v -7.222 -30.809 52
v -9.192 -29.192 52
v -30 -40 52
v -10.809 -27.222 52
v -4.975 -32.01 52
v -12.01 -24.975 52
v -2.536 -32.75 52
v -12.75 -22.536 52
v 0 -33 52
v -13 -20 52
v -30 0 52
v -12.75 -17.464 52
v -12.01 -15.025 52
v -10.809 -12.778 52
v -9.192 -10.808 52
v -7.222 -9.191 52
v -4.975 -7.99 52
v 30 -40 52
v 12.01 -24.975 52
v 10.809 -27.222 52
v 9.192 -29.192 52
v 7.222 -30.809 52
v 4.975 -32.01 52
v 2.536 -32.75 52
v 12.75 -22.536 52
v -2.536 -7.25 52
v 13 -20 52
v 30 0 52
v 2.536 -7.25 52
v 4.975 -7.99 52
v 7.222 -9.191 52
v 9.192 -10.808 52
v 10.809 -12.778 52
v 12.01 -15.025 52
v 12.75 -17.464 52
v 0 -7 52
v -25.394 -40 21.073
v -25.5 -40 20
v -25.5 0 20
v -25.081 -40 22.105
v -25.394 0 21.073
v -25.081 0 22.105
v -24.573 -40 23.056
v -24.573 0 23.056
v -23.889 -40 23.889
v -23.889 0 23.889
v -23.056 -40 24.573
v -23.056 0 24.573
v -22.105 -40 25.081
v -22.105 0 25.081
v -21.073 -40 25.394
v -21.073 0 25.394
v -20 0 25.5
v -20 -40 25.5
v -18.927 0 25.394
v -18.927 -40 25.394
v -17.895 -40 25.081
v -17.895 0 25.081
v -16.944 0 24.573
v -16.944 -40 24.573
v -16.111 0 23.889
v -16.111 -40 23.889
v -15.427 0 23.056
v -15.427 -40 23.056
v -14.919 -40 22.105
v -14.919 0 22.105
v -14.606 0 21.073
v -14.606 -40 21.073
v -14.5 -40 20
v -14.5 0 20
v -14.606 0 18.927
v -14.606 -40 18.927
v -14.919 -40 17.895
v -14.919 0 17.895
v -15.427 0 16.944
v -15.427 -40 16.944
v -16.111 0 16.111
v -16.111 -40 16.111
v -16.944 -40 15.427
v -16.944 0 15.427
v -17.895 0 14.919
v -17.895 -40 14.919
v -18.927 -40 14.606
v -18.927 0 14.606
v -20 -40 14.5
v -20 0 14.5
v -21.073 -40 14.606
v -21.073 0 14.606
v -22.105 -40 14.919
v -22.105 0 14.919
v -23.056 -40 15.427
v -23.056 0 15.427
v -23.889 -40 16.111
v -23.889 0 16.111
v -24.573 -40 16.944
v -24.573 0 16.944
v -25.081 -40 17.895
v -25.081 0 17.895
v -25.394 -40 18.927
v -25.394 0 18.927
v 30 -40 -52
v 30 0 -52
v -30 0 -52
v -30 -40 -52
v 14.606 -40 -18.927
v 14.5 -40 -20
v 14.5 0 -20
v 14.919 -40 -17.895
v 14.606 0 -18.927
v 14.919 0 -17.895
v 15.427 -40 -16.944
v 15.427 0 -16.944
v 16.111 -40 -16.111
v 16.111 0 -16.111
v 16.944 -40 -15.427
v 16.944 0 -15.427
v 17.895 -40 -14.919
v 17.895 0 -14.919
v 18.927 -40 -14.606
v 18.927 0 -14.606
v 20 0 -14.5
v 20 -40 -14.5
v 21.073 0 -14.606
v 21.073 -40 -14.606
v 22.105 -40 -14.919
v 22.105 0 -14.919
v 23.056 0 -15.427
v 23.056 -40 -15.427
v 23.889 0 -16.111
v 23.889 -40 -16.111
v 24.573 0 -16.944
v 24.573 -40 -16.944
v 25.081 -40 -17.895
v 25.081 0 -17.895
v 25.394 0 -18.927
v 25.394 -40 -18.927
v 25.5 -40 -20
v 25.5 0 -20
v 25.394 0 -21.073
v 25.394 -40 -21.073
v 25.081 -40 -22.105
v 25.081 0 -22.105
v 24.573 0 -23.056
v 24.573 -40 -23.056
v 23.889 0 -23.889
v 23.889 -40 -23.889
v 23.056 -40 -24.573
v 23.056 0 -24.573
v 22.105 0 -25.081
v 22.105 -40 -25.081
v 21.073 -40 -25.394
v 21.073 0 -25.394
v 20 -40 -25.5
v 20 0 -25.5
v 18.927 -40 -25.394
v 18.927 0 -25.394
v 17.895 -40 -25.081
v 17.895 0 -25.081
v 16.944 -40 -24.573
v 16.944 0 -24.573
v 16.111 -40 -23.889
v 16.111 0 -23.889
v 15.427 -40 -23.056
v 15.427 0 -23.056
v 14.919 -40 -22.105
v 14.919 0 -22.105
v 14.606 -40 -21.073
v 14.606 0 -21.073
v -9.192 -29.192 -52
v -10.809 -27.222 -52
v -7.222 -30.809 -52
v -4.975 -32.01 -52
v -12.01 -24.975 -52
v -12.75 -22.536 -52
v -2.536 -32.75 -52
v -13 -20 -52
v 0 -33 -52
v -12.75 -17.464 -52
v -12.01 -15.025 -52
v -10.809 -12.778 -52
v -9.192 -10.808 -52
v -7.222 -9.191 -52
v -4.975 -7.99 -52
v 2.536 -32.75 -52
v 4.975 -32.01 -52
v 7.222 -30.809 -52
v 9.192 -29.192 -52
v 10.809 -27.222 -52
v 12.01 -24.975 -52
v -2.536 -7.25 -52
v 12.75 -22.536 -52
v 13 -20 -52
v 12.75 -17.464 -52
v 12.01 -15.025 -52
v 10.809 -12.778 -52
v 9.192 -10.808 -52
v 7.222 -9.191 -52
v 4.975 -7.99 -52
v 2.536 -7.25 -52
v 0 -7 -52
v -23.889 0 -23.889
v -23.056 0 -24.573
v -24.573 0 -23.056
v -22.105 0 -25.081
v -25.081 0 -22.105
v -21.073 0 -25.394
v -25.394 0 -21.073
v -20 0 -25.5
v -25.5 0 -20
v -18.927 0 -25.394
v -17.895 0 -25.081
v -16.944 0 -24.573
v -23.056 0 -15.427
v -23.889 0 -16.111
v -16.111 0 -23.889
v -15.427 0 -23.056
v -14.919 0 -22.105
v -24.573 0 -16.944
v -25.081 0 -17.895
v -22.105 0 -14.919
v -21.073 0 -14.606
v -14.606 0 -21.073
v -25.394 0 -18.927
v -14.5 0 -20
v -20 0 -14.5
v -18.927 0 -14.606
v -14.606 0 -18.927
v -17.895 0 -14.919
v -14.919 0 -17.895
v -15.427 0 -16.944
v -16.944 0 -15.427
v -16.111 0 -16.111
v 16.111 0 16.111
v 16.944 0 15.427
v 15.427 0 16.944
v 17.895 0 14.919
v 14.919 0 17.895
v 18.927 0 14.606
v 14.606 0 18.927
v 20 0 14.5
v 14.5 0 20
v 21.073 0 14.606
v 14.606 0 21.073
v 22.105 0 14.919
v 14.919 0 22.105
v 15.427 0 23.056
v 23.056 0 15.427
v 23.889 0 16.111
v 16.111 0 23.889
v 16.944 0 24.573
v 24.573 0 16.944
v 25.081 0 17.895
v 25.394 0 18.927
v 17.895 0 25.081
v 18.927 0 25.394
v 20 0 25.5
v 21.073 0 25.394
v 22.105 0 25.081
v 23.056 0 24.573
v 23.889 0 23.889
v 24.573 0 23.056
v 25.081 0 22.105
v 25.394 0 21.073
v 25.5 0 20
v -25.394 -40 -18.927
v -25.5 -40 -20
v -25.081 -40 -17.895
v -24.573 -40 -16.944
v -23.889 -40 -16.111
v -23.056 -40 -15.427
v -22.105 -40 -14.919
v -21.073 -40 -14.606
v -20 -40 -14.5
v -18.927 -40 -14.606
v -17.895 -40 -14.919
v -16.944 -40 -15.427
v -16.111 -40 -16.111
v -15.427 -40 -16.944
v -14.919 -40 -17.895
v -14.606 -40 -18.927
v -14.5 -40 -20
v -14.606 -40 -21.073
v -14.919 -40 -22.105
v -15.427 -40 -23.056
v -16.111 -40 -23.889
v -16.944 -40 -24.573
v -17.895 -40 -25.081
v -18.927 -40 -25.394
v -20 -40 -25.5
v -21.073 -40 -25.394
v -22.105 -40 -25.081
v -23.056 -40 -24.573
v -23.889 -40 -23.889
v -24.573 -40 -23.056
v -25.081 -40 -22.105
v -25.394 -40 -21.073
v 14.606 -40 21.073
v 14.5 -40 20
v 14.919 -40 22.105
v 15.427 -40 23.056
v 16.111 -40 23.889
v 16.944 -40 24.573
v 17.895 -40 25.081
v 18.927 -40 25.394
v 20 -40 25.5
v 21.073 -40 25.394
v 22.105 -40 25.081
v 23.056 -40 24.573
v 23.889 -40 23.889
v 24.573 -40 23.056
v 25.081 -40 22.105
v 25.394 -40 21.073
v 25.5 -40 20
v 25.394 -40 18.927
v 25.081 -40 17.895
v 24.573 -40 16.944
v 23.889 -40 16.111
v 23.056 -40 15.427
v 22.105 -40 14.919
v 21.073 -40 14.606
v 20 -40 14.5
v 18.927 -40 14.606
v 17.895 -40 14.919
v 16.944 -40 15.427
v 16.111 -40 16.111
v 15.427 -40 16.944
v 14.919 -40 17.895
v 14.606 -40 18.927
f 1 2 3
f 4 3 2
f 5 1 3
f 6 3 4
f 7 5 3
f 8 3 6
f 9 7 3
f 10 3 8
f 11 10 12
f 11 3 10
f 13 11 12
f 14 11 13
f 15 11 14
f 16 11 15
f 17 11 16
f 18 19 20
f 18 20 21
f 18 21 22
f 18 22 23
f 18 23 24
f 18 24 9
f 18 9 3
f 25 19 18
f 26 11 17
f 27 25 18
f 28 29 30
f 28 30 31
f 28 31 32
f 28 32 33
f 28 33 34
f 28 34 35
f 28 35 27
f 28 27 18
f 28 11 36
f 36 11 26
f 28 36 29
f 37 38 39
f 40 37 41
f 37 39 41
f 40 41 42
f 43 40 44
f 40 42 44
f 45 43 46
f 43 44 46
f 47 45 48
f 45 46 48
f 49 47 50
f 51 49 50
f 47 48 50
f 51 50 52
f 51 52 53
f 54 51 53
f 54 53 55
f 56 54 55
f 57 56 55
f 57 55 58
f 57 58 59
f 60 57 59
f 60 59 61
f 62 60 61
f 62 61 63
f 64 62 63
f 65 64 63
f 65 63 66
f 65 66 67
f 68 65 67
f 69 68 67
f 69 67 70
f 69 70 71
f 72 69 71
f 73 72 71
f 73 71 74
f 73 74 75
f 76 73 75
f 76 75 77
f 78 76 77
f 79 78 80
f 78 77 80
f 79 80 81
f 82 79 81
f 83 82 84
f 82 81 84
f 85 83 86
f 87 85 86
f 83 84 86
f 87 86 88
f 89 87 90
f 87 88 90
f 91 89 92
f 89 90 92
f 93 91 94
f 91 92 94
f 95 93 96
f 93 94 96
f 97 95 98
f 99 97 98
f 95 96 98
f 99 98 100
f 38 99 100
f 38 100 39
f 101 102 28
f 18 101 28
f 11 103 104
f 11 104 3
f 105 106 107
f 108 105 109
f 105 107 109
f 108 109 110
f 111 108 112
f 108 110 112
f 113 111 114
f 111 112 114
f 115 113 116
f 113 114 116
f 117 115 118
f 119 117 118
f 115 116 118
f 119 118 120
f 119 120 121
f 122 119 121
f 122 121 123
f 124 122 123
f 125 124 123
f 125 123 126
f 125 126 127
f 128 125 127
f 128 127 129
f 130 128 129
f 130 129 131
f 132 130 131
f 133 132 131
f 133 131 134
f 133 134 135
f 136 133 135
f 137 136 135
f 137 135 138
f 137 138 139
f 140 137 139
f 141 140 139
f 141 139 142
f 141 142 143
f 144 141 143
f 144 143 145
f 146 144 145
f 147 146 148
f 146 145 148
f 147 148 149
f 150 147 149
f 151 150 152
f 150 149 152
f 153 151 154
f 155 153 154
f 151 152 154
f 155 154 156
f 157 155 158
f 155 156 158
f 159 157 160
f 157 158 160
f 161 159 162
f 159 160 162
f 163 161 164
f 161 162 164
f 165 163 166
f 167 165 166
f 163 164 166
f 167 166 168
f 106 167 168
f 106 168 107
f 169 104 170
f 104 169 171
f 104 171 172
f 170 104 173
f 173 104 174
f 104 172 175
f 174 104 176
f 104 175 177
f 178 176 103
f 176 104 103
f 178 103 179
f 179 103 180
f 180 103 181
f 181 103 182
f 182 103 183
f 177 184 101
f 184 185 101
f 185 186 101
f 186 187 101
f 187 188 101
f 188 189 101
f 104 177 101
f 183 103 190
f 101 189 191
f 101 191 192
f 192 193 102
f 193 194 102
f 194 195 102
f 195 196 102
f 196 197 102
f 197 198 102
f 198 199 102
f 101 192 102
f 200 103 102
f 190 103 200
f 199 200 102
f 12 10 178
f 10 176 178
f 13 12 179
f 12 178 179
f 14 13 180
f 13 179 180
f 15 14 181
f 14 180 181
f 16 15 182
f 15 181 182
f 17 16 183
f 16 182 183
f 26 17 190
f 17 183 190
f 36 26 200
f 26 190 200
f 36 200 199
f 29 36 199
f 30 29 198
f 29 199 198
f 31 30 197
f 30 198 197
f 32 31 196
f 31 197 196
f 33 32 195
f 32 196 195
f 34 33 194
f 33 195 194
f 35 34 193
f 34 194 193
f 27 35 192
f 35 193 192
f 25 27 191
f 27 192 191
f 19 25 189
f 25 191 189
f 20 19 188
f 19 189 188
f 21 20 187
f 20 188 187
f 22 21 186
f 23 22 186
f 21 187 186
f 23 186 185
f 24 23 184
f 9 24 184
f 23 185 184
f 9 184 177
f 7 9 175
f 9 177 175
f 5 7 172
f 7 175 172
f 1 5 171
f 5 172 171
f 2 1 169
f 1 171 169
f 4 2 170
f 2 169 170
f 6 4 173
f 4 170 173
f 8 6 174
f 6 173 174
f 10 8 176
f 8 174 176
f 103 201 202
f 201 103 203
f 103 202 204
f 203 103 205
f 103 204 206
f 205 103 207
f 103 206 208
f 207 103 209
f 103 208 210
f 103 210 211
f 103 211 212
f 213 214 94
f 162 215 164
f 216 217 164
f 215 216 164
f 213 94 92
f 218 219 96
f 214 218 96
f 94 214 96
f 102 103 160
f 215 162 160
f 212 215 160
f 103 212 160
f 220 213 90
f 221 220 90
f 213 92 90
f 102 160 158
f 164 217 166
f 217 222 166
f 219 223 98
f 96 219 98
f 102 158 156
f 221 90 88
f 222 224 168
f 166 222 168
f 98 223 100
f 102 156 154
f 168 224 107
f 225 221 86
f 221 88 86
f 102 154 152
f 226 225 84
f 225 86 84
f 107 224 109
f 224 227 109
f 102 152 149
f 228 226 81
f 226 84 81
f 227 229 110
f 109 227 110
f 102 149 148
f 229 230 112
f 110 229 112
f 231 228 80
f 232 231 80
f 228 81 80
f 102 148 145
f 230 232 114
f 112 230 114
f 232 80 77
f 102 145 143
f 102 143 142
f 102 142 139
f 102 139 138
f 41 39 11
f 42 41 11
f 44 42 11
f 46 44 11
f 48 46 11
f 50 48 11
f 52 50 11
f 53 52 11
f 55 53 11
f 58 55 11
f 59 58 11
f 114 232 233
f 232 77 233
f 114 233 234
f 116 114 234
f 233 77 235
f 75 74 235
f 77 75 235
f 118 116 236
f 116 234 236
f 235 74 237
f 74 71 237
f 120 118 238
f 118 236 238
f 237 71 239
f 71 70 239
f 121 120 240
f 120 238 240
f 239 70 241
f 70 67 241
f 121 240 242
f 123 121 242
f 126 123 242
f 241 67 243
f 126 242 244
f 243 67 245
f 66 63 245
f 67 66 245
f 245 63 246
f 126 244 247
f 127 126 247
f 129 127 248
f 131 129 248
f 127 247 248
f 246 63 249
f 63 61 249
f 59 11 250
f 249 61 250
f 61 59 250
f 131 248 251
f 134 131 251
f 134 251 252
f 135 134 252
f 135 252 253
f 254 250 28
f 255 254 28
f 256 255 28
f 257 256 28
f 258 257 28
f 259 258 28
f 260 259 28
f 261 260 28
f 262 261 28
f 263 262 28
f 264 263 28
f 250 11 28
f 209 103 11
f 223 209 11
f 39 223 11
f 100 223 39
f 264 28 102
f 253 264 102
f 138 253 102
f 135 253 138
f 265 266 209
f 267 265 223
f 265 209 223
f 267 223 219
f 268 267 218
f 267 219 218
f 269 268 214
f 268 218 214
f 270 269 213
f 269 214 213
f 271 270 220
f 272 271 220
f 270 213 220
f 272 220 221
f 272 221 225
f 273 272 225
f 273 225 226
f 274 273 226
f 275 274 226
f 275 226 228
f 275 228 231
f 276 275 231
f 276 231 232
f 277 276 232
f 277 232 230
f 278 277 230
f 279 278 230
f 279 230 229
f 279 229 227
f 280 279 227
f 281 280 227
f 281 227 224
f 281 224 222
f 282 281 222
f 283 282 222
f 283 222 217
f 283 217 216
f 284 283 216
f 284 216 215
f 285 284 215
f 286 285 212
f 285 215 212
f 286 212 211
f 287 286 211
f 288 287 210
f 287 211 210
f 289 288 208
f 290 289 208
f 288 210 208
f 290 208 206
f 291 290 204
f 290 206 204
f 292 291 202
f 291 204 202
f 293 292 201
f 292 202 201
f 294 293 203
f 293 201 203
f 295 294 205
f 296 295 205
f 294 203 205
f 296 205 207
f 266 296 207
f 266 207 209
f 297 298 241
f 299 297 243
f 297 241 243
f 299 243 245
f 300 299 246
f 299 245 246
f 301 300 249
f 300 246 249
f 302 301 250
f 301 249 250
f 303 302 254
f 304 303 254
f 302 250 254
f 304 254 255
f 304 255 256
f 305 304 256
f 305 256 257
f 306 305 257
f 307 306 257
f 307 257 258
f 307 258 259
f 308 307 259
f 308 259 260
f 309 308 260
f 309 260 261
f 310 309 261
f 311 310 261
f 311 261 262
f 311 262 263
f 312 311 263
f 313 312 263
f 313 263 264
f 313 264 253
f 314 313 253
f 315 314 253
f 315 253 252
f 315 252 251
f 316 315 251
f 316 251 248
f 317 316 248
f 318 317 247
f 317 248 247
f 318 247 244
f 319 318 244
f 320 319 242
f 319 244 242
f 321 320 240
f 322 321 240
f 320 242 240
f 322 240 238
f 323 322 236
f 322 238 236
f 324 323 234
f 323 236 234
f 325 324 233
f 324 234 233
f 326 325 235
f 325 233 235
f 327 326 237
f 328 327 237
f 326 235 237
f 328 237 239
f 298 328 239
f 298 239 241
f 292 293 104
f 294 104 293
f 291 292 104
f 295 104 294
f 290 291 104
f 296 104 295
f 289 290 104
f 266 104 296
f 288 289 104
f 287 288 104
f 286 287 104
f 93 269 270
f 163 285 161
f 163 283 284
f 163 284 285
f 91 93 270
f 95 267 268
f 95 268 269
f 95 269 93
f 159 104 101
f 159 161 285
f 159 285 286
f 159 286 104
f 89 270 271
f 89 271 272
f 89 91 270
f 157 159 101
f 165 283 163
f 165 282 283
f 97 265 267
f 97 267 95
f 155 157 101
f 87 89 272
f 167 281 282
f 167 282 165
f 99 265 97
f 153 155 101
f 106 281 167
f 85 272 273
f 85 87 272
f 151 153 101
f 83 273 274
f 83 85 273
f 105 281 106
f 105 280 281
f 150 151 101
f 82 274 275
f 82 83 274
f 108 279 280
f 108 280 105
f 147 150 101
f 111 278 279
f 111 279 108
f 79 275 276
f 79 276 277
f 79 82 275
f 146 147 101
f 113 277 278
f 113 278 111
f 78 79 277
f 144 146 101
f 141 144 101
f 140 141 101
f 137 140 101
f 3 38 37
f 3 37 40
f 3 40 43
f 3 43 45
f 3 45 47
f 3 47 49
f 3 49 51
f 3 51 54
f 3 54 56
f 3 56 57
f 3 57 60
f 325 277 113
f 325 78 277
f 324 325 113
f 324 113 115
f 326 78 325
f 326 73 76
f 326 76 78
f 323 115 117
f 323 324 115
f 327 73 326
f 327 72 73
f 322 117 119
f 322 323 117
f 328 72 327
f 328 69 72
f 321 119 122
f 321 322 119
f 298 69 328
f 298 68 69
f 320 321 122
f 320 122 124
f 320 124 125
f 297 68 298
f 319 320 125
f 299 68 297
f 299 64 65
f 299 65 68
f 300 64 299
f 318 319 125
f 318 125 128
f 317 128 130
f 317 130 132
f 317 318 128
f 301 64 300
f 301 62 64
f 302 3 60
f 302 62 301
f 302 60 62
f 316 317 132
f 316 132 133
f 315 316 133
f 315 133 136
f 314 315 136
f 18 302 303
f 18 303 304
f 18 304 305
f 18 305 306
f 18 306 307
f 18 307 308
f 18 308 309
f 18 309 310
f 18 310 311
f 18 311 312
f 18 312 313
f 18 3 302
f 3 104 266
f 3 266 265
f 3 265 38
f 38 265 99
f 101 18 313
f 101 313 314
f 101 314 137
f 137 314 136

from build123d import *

# Parameters (mm, degrees)
F0_W     = 60
F0_H     = 104
F1_DEPTH = 40
F3_D     = 26
F3_DEPTH = 104
F3_TIP   = 7.8111880474
F5_D     = 11
F5_DEPTH = 104
F5_TIP   = 3.3047334047


with BuildPart() as f1:
    # F0 (on Front) → F1 (new body)
    with BuildSketch(Plane.XZ):
        Rectangle(F0_W, F0_H)
    extrude(amount=F1_DEPTH)

    # F3
    with Locations(Plane.XY.offset(52)):
        with Locations((0, -20)):
            Hole(F3_D / 2, depth=F3_DEPTH)
            with Locations((0, 0, -(F3_DEPTH + F3_TIP / 2))):  # 118° drill point
                Cone(0, F3_D / 2, F3_TIP, mode=Mode.SUBTRACT)

    # F5
    with Locations(Plane.XZ.offset(40)):
        with Locations((-20, 20), (-20, -20), (20, -20), (20, 20)):
            Hole(F5_D / 2, depth=F5_DEPTH)
            with Locations((0, 0, -(F5_DEPTH + F5_TIP / 2))):  # 118° drill point
                Cone(0, F5_D / 2, F5_TIP, mode=Mode.SUBTRACT)


solid = f1.part
